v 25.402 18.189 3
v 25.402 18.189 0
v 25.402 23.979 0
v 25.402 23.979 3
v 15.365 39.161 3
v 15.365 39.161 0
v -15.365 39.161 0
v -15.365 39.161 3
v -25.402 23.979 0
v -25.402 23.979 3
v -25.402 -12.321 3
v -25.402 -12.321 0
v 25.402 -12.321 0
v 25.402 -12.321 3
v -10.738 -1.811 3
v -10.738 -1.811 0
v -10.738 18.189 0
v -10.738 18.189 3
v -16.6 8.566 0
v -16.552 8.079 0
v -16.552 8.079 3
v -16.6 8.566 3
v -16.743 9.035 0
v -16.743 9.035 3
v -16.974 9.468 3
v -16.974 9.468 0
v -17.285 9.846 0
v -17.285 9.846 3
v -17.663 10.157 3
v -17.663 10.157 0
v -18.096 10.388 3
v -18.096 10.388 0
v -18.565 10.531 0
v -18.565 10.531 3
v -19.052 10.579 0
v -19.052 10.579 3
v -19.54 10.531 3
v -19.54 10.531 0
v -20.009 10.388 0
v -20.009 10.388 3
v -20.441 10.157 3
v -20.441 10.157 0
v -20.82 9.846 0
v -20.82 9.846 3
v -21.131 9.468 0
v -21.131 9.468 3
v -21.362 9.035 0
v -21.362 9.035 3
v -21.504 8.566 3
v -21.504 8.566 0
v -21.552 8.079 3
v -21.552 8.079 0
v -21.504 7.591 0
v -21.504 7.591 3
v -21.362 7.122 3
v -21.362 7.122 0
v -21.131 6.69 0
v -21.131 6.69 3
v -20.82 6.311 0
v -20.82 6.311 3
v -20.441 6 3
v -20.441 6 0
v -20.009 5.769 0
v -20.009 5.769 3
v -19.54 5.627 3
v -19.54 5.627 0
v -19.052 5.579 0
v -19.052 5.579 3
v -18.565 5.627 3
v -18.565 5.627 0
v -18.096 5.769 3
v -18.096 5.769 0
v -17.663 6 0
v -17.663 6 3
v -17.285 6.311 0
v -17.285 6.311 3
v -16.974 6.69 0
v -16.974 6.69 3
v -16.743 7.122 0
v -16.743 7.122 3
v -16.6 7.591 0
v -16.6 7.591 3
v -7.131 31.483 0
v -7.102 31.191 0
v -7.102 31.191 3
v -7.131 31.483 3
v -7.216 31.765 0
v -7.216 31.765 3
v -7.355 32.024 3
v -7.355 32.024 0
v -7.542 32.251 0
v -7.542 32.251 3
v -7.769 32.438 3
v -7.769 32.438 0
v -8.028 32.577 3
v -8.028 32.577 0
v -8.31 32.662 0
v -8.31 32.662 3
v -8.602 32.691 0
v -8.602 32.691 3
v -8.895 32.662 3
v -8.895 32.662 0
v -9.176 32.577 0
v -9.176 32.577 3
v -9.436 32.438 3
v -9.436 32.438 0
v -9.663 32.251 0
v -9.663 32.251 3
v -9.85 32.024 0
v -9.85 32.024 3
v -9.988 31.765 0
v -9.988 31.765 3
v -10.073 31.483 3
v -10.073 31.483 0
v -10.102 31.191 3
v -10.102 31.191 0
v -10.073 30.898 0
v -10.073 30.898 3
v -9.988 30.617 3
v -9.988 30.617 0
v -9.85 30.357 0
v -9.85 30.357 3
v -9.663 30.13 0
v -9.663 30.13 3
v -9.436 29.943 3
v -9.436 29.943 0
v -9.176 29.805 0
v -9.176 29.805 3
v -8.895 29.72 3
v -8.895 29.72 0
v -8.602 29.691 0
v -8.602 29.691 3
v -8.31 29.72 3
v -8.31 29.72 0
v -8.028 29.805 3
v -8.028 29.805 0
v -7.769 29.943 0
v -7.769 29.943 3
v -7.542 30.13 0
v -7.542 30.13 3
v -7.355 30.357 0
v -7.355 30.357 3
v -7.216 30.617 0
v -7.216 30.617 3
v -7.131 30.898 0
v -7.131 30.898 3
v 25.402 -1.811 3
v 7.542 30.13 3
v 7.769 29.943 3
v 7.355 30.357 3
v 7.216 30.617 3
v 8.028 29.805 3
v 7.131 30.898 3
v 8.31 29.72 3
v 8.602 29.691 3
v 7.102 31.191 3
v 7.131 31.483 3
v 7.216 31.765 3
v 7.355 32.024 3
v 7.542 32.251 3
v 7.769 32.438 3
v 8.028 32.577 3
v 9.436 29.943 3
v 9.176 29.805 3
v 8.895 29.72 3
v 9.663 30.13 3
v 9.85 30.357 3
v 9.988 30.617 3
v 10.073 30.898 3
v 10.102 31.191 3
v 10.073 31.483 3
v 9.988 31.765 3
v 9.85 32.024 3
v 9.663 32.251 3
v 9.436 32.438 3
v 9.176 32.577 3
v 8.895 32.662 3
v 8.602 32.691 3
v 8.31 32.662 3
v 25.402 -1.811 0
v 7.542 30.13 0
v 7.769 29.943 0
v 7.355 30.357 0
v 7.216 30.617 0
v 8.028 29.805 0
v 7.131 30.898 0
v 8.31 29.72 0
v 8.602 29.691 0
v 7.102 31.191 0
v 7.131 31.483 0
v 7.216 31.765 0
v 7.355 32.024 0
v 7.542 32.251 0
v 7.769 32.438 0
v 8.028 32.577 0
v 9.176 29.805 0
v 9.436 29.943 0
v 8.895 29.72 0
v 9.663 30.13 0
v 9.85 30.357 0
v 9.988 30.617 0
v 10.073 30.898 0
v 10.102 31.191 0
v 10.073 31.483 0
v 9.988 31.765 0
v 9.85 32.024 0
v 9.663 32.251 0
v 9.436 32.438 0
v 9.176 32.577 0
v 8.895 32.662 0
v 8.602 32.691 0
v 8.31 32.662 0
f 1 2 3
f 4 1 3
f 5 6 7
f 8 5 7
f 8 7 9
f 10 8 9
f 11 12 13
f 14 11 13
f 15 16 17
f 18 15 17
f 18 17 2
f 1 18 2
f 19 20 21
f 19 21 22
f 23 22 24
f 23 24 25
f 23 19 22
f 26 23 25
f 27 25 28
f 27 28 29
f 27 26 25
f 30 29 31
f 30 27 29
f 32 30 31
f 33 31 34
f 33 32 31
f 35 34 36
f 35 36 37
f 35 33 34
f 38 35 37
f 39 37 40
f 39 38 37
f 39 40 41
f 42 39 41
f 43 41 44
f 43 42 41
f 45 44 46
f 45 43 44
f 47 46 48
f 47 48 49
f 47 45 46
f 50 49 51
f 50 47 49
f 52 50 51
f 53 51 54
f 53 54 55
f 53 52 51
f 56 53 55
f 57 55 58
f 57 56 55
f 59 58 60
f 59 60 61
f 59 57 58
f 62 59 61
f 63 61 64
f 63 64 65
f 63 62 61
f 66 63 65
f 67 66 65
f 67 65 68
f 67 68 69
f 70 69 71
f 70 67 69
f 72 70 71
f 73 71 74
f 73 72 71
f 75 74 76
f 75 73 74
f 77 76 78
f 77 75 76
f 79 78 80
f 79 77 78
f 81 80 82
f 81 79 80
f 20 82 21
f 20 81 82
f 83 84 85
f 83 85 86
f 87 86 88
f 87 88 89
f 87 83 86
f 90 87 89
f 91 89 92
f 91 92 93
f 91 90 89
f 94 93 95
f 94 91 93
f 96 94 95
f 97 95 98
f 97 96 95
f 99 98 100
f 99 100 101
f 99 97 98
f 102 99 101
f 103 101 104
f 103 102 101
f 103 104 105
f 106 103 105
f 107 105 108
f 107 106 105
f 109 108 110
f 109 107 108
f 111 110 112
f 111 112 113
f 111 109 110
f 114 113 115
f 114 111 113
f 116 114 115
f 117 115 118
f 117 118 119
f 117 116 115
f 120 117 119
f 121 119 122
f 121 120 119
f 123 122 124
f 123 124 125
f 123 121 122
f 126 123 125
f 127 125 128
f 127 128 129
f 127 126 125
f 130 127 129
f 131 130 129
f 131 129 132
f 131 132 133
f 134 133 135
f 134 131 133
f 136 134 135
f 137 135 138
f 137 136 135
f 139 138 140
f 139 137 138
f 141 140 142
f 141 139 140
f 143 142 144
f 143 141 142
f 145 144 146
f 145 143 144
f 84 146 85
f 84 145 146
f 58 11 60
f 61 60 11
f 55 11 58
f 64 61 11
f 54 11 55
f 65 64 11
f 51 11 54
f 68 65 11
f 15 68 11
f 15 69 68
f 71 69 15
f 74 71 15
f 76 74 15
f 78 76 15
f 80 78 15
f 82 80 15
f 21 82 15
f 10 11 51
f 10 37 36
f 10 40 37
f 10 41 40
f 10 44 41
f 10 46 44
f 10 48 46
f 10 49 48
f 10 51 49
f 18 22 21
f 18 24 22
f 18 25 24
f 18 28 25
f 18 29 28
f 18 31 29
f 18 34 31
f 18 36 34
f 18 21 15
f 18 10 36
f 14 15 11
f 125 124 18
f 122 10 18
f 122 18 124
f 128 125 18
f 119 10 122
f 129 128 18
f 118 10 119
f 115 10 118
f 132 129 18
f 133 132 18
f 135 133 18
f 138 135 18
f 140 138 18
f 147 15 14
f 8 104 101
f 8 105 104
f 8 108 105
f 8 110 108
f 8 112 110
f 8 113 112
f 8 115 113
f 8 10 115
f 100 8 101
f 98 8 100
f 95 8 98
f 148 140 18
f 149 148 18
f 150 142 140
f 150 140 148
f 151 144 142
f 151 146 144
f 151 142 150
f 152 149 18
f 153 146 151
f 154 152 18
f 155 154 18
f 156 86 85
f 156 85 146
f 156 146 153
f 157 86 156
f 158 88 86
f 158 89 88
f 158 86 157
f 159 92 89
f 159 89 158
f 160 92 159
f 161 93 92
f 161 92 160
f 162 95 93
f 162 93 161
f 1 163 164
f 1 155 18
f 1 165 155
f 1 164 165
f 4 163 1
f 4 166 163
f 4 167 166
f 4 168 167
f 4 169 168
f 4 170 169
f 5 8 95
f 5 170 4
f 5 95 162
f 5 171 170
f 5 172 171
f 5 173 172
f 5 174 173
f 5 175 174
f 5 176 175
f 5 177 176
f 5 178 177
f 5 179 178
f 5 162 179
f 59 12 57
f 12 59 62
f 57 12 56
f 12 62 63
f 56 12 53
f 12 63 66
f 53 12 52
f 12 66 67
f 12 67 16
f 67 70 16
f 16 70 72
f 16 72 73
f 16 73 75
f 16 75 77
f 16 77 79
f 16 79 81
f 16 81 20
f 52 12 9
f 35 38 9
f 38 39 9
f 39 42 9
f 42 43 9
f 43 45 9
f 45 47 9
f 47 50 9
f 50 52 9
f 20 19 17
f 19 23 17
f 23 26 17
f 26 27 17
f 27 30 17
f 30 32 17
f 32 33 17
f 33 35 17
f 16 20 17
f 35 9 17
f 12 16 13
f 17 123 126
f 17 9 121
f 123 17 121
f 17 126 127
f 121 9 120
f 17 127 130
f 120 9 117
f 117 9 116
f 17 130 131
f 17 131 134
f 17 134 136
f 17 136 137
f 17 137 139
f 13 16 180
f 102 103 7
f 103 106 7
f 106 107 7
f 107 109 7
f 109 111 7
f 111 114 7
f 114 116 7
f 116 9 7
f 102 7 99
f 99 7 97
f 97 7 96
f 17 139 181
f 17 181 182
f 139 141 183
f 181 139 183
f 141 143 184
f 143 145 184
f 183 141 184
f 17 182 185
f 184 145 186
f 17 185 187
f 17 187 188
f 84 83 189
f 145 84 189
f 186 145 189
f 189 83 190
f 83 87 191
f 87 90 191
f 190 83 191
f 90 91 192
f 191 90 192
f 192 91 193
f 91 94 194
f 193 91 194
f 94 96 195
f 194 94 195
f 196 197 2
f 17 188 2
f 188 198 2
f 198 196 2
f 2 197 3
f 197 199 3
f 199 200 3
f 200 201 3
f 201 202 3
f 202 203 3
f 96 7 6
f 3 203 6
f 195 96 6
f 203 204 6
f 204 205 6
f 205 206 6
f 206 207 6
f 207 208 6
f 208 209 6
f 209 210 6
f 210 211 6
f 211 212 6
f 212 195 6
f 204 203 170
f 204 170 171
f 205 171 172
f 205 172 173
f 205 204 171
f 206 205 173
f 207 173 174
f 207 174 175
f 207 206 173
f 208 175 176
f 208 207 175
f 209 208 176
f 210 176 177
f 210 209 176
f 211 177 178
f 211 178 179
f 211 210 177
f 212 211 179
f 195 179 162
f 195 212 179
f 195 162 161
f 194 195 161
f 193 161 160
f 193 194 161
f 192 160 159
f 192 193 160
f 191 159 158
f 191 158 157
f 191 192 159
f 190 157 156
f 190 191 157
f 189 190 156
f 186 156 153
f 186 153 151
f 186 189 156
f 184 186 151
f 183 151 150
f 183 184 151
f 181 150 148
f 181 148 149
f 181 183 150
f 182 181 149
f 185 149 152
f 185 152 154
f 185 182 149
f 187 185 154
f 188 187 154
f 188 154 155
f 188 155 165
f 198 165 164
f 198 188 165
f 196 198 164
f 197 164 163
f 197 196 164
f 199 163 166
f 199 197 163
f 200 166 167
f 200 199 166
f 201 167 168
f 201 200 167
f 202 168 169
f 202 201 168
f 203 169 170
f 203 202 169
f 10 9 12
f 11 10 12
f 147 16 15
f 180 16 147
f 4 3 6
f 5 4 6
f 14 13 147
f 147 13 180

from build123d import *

# Parameters (mm, degrees)
SKETCH1_R           = 2.5
SKETCH1_R_2         = 1.5
SKETCH1_W           = 25.402305243
SKETCH1_H           = 10.51
BOSS_EXTRUDE1_DEPTH = 3


with BuildPart() as part:
    # Sketch1 → Boss-Extrude1 (new body)
    # profile 1 of 3: a face of its own
    with BuildSketch(Plane.XY):
        Polygon((-25.402305243, -12.3212841), (0, -12.3212841), (0, -1.8112841), (-10.737694757, -1.8112841), (-10.737694757, 18.1887159), (0, 18.1887159), (0, 39.160695464), (-15.365, 39.160695464), (-25.402305243, 23.9787159), align=None)
        with Locations((-19.052305243, 8.0787159)):
            Circle(SKETCH1_R, mode=Mode.SUBTRACT)
        with Locations((-8.602305243, 31.190695464)):
            Circle(SKETCH1_R_2, mode=Mode.SUBTRACT)
    # profile 2 of 3: a face of its own
    with BuildSketch(Plane.XY):
        Polygon((0, 39.160695464), (0, 18.1887159), (25.402305243, 18.1887159), (25.402305243, 23.9787159), (15.365, 39.160695464), align=None)
        with Locations((8.602305243, 31.190695464)):
            Circle(SKETCH1_R_2, mode=Mode.SUBTRACT)
    # profile 3 of 3: a face of its own
    with BuildSketch(Plane.XY):
        with Locations((12.701152622, -7.0662841)):
            Rectangle(SKETCH1_W, SKETCH1_H)
    extrude(amount=BOSS_EXTRUDE1_DEPTH)


solid = part.part
